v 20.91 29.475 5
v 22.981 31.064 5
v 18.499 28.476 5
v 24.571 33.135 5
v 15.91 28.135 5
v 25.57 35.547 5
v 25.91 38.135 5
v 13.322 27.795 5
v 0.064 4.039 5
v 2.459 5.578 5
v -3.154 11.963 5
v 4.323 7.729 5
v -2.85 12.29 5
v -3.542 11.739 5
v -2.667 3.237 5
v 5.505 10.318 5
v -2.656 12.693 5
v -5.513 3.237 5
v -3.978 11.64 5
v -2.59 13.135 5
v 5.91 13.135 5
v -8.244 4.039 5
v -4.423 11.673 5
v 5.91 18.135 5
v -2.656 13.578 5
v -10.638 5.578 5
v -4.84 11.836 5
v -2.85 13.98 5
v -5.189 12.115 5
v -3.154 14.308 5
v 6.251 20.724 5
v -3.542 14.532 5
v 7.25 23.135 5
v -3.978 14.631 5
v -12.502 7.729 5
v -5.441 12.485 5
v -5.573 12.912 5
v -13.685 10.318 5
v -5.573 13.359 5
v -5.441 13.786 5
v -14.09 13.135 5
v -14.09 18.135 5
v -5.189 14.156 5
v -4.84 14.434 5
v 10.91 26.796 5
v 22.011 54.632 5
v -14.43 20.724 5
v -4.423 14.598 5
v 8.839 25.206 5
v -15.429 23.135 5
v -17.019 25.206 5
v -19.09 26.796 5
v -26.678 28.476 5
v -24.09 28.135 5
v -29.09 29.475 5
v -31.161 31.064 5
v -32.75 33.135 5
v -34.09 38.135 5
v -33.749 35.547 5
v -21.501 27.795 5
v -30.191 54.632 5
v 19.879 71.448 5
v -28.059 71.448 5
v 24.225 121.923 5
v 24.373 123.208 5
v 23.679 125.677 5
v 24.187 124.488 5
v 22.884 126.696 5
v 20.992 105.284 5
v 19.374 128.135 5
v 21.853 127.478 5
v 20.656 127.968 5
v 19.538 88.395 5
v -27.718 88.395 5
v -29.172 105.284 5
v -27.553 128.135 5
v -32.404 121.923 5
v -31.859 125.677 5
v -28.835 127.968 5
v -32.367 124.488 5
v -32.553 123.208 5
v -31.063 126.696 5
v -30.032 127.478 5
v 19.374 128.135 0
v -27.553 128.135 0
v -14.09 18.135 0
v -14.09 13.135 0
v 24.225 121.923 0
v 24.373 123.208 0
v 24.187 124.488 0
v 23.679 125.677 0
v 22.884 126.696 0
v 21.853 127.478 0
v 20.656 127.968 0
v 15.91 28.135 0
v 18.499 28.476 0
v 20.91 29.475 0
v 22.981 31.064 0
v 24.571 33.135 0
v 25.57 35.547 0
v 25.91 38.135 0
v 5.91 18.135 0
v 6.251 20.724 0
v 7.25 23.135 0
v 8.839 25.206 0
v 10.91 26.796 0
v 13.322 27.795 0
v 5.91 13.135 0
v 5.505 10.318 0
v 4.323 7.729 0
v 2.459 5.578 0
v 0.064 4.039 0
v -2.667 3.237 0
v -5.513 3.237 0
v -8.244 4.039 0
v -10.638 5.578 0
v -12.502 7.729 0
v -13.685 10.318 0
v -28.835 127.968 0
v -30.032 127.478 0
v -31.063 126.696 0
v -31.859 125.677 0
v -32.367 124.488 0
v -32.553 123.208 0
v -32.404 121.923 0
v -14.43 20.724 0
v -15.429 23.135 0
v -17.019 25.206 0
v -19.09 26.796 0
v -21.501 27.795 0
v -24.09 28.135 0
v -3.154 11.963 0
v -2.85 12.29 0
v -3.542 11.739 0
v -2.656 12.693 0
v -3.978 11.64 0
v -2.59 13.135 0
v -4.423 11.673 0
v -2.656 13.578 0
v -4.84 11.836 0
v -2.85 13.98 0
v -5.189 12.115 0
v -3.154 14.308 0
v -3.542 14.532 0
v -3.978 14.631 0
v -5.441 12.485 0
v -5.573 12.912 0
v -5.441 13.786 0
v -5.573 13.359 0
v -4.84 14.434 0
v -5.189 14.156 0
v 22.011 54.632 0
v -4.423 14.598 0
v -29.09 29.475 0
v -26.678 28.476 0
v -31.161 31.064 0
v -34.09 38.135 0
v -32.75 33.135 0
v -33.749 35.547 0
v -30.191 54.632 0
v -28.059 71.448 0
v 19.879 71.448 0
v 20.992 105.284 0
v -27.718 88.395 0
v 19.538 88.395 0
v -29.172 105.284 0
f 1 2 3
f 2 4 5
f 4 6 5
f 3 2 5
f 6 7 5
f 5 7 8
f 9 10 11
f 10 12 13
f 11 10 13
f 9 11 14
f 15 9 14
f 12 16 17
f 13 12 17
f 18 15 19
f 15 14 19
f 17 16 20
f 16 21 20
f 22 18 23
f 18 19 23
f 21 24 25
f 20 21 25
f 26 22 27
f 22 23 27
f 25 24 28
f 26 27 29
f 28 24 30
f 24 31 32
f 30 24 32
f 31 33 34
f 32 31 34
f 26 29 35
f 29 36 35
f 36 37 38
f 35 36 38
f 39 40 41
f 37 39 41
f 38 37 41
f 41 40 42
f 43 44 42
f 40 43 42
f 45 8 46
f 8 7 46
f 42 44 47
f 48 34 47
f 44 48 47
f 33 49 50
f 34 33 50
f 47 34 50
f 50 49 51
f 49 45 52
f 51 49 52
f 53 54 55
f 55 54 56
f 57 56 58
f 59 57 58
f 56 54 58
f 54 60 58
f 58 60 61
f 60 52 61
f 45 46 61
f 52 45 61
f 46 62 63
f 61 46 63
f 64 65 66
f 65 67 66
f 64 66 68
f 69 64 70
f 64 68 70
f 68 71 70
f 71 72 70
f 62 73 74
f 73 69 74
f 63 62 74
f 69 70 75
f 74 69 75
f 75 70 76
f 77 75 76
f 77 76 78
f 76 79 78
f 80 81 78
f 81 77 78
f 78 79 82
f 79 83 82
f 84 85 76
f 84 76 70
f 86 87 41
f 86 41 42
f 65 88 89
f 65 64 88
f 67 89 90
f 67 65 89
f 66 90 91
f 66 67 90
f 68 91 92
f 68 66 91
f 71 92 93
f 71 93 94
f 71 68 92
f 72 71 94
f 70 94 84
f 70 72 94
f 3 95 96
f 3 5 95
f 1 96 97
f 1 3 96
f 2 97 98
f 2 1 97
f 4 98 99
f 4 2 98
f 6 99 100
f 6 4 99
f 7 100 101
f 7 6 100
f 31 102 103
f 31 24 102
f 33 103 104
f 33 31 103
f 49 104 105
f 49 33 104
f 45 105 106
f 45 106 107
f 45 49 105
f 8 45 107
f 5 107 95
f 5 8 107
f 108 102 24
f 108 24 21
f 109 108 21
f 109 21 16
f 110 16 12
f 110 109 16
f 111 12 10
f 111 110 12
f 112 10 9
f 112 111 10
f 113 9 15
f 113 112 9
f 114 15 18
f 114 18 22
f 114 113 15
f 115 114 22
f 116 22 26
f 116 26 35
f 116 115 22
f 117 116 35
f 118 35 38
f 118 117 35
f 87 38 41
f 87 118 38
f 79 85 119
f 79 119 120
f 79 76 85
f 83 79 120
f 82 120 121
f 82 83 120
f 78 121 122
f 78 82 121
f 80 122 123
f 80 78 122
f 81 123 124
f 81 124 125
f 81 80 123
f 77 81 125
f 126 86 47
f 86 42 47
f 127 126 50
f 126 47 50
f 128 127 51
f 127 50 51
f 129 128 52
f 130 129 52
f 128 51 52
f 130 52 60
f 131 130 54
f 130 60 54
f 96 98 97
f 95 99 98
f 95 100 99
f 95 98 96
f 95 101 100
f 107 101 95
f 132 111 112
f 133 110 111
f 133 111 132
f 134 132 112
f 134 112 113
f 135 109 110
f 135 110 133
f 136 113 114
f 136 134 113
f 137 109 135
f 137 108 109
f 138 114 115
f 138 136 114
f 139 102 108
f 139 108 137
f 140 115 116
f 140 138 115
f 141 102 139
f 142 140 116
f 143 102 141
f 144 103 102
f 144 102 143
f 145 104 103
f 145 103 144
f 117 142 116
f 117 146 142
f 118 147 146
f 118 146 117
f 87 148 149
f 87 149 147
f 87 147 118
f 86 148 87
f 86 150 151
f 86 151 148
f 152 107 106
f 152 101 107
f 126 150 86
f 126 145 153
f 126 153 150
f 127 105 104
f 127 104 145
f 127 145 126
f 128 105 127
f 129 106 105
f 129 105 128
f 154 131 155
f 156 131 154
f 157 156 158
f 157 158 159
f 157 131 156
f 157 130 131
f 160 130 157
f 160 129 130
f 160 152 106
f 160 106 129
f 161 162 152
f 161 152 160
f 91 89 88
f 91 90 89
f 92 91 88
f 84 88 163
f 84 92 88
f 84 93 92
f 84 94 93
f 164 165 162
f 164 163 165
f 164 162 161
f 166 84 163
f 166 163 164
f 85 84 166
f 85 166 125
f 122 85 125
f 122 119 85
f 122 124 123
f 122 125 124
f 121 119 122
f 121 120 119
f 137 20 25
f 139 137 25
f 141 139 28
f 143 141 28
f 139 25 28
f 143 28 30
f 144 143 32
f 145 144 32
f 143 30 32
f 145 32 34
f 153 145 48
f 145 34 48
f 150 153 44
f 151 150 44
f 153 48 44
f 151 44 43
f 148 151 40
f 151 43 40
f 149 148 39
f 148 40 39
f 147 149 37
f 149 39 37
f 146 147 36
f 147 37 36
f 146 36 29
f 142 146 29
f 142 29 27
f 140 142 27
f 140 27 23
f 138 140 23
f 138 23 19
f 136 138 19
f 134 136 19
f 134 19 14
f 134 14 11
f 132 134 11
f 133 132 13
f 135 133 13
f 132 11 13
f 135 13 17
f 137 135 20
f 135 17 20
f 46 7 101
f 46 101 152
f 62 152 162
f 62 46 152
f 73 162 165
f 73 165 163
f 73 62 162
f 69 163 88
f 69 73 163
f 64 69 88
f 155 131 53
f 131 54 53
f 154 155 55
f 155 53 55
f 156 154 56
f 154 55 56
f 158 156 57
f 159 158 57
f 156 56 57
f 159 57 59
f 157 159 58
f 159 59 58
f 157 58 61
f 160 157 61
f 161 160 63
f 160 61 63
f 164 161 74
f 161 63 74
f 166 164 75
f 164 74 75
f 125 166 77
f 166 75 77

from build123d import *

# Parameters (mm, degrees)
RESSALTO_EXTRUS_O1_DEPTH = 5
ESBO_O2_R                = 1.5
CORTE_EXTRUS_O1_DEPTH    = 5
FILETE1_R                = 10
CORTE_EXTRUS_O2_DEPTH    = 5
FILETE2_R                = 5


with BuildPart() as part:
    # Esboço1 → Ressalto-extrusão1 (new body)
    with BuildSketch(Plane.XY):
        with BuildLine():
            Line((-14.089663978, 13.135393664), (-14.089663978, 28.135393664))
            Line((-14.089663978, 28.135393664), (-34.089663978, 28.135393664))
            Line((-34.089663978, 28.135393664), (-34.089663978, 128.135393664))
            Line((-34.089663978, 128.135393664), (25.910336022, 128.135393664))
            Line((25.910336022, 128.135393664), (25.910336022, 28.135393664))
            Line((25.910336022, 28.135393664), (5.910336022, 28.135393664))
            Line((5.910336022, 28.135393664), (5.910336022, 13.135393664))
            ThreePointArc((5.910336022, 13.135393664), (-4.089663978, 3.135393664), (-14.089663978, 13.135393664))
        make_face()
    extrude(amount=RESSALTO_EXTRUS_O1_DEPTH)

    # Esboço2 → Corte-extrusão1 (cut)
    with BuildSketch(Plane.XY.offset(5)):
        with Locations((-4.089663978, 13.135393664)):
            Circle(ESBO_O2_R)
    extrude(amount=-CORTE_EXTRUS_O1_DEPTH, mode=Mode.SUBTRACT)

    # Filete1
    filete1_edges = [part.edges().sort_by_distance(p)[0] for p in [
        (5.910336022, 28.135393664, 2.5),
        (-14.089663978, 28.135393664, 2.5),
    ]]
    fillet(filete1_edges, radius=FILETE1_R)
    filete1_2_edges = [part.edges().sort_by_distance(p)[0] for p in [
        (25.910336022, 28.135393664, 2.5),
        (-34.089663978, 28.135393664, 2.5),
    ]]
    fillet(filete1_2_edges, radius=FILETE1_R - 0.0001)  # a hair under: the kernel refuses the full size

    # Esboço3 → Corte-extrusão2 (cut)
    with BuildSketch(Plane.XY.offset(5)):
        with BuildLine():
            ThreePointArc((-34.089663978, 38.135393664), (-27.631189305, 83.135393664), (-34.089663978, 128.135393664))
            Line((-34.089663978, 128.135393664), (-34.089663978, 38.135393664))
        make_face()
        with BuildLine():
            ThreePointArc((25.910336022, 38.135393664), (19.45186135, 83.135393664), (25.910336022, 128.135393664))
            Line((25.910336022, 128.135393664), (25.910336022, 38.135393664))
        make_face()
    extrude(amount=-CORTE_EXTRUS_O2_DEPTH, mode=Mode.SUBTRACT)

    # Filete2
    filete2_edges = [part.edges().sort_by_distance(p)[0] for p in [
        (-34.089663978, 128.135393664, 2.5),
        (25.910336022, 128.135393664, 2.5),
    ]]
    fillet(filete2_edges, radius=FILETE2_R)


solid = part.part
